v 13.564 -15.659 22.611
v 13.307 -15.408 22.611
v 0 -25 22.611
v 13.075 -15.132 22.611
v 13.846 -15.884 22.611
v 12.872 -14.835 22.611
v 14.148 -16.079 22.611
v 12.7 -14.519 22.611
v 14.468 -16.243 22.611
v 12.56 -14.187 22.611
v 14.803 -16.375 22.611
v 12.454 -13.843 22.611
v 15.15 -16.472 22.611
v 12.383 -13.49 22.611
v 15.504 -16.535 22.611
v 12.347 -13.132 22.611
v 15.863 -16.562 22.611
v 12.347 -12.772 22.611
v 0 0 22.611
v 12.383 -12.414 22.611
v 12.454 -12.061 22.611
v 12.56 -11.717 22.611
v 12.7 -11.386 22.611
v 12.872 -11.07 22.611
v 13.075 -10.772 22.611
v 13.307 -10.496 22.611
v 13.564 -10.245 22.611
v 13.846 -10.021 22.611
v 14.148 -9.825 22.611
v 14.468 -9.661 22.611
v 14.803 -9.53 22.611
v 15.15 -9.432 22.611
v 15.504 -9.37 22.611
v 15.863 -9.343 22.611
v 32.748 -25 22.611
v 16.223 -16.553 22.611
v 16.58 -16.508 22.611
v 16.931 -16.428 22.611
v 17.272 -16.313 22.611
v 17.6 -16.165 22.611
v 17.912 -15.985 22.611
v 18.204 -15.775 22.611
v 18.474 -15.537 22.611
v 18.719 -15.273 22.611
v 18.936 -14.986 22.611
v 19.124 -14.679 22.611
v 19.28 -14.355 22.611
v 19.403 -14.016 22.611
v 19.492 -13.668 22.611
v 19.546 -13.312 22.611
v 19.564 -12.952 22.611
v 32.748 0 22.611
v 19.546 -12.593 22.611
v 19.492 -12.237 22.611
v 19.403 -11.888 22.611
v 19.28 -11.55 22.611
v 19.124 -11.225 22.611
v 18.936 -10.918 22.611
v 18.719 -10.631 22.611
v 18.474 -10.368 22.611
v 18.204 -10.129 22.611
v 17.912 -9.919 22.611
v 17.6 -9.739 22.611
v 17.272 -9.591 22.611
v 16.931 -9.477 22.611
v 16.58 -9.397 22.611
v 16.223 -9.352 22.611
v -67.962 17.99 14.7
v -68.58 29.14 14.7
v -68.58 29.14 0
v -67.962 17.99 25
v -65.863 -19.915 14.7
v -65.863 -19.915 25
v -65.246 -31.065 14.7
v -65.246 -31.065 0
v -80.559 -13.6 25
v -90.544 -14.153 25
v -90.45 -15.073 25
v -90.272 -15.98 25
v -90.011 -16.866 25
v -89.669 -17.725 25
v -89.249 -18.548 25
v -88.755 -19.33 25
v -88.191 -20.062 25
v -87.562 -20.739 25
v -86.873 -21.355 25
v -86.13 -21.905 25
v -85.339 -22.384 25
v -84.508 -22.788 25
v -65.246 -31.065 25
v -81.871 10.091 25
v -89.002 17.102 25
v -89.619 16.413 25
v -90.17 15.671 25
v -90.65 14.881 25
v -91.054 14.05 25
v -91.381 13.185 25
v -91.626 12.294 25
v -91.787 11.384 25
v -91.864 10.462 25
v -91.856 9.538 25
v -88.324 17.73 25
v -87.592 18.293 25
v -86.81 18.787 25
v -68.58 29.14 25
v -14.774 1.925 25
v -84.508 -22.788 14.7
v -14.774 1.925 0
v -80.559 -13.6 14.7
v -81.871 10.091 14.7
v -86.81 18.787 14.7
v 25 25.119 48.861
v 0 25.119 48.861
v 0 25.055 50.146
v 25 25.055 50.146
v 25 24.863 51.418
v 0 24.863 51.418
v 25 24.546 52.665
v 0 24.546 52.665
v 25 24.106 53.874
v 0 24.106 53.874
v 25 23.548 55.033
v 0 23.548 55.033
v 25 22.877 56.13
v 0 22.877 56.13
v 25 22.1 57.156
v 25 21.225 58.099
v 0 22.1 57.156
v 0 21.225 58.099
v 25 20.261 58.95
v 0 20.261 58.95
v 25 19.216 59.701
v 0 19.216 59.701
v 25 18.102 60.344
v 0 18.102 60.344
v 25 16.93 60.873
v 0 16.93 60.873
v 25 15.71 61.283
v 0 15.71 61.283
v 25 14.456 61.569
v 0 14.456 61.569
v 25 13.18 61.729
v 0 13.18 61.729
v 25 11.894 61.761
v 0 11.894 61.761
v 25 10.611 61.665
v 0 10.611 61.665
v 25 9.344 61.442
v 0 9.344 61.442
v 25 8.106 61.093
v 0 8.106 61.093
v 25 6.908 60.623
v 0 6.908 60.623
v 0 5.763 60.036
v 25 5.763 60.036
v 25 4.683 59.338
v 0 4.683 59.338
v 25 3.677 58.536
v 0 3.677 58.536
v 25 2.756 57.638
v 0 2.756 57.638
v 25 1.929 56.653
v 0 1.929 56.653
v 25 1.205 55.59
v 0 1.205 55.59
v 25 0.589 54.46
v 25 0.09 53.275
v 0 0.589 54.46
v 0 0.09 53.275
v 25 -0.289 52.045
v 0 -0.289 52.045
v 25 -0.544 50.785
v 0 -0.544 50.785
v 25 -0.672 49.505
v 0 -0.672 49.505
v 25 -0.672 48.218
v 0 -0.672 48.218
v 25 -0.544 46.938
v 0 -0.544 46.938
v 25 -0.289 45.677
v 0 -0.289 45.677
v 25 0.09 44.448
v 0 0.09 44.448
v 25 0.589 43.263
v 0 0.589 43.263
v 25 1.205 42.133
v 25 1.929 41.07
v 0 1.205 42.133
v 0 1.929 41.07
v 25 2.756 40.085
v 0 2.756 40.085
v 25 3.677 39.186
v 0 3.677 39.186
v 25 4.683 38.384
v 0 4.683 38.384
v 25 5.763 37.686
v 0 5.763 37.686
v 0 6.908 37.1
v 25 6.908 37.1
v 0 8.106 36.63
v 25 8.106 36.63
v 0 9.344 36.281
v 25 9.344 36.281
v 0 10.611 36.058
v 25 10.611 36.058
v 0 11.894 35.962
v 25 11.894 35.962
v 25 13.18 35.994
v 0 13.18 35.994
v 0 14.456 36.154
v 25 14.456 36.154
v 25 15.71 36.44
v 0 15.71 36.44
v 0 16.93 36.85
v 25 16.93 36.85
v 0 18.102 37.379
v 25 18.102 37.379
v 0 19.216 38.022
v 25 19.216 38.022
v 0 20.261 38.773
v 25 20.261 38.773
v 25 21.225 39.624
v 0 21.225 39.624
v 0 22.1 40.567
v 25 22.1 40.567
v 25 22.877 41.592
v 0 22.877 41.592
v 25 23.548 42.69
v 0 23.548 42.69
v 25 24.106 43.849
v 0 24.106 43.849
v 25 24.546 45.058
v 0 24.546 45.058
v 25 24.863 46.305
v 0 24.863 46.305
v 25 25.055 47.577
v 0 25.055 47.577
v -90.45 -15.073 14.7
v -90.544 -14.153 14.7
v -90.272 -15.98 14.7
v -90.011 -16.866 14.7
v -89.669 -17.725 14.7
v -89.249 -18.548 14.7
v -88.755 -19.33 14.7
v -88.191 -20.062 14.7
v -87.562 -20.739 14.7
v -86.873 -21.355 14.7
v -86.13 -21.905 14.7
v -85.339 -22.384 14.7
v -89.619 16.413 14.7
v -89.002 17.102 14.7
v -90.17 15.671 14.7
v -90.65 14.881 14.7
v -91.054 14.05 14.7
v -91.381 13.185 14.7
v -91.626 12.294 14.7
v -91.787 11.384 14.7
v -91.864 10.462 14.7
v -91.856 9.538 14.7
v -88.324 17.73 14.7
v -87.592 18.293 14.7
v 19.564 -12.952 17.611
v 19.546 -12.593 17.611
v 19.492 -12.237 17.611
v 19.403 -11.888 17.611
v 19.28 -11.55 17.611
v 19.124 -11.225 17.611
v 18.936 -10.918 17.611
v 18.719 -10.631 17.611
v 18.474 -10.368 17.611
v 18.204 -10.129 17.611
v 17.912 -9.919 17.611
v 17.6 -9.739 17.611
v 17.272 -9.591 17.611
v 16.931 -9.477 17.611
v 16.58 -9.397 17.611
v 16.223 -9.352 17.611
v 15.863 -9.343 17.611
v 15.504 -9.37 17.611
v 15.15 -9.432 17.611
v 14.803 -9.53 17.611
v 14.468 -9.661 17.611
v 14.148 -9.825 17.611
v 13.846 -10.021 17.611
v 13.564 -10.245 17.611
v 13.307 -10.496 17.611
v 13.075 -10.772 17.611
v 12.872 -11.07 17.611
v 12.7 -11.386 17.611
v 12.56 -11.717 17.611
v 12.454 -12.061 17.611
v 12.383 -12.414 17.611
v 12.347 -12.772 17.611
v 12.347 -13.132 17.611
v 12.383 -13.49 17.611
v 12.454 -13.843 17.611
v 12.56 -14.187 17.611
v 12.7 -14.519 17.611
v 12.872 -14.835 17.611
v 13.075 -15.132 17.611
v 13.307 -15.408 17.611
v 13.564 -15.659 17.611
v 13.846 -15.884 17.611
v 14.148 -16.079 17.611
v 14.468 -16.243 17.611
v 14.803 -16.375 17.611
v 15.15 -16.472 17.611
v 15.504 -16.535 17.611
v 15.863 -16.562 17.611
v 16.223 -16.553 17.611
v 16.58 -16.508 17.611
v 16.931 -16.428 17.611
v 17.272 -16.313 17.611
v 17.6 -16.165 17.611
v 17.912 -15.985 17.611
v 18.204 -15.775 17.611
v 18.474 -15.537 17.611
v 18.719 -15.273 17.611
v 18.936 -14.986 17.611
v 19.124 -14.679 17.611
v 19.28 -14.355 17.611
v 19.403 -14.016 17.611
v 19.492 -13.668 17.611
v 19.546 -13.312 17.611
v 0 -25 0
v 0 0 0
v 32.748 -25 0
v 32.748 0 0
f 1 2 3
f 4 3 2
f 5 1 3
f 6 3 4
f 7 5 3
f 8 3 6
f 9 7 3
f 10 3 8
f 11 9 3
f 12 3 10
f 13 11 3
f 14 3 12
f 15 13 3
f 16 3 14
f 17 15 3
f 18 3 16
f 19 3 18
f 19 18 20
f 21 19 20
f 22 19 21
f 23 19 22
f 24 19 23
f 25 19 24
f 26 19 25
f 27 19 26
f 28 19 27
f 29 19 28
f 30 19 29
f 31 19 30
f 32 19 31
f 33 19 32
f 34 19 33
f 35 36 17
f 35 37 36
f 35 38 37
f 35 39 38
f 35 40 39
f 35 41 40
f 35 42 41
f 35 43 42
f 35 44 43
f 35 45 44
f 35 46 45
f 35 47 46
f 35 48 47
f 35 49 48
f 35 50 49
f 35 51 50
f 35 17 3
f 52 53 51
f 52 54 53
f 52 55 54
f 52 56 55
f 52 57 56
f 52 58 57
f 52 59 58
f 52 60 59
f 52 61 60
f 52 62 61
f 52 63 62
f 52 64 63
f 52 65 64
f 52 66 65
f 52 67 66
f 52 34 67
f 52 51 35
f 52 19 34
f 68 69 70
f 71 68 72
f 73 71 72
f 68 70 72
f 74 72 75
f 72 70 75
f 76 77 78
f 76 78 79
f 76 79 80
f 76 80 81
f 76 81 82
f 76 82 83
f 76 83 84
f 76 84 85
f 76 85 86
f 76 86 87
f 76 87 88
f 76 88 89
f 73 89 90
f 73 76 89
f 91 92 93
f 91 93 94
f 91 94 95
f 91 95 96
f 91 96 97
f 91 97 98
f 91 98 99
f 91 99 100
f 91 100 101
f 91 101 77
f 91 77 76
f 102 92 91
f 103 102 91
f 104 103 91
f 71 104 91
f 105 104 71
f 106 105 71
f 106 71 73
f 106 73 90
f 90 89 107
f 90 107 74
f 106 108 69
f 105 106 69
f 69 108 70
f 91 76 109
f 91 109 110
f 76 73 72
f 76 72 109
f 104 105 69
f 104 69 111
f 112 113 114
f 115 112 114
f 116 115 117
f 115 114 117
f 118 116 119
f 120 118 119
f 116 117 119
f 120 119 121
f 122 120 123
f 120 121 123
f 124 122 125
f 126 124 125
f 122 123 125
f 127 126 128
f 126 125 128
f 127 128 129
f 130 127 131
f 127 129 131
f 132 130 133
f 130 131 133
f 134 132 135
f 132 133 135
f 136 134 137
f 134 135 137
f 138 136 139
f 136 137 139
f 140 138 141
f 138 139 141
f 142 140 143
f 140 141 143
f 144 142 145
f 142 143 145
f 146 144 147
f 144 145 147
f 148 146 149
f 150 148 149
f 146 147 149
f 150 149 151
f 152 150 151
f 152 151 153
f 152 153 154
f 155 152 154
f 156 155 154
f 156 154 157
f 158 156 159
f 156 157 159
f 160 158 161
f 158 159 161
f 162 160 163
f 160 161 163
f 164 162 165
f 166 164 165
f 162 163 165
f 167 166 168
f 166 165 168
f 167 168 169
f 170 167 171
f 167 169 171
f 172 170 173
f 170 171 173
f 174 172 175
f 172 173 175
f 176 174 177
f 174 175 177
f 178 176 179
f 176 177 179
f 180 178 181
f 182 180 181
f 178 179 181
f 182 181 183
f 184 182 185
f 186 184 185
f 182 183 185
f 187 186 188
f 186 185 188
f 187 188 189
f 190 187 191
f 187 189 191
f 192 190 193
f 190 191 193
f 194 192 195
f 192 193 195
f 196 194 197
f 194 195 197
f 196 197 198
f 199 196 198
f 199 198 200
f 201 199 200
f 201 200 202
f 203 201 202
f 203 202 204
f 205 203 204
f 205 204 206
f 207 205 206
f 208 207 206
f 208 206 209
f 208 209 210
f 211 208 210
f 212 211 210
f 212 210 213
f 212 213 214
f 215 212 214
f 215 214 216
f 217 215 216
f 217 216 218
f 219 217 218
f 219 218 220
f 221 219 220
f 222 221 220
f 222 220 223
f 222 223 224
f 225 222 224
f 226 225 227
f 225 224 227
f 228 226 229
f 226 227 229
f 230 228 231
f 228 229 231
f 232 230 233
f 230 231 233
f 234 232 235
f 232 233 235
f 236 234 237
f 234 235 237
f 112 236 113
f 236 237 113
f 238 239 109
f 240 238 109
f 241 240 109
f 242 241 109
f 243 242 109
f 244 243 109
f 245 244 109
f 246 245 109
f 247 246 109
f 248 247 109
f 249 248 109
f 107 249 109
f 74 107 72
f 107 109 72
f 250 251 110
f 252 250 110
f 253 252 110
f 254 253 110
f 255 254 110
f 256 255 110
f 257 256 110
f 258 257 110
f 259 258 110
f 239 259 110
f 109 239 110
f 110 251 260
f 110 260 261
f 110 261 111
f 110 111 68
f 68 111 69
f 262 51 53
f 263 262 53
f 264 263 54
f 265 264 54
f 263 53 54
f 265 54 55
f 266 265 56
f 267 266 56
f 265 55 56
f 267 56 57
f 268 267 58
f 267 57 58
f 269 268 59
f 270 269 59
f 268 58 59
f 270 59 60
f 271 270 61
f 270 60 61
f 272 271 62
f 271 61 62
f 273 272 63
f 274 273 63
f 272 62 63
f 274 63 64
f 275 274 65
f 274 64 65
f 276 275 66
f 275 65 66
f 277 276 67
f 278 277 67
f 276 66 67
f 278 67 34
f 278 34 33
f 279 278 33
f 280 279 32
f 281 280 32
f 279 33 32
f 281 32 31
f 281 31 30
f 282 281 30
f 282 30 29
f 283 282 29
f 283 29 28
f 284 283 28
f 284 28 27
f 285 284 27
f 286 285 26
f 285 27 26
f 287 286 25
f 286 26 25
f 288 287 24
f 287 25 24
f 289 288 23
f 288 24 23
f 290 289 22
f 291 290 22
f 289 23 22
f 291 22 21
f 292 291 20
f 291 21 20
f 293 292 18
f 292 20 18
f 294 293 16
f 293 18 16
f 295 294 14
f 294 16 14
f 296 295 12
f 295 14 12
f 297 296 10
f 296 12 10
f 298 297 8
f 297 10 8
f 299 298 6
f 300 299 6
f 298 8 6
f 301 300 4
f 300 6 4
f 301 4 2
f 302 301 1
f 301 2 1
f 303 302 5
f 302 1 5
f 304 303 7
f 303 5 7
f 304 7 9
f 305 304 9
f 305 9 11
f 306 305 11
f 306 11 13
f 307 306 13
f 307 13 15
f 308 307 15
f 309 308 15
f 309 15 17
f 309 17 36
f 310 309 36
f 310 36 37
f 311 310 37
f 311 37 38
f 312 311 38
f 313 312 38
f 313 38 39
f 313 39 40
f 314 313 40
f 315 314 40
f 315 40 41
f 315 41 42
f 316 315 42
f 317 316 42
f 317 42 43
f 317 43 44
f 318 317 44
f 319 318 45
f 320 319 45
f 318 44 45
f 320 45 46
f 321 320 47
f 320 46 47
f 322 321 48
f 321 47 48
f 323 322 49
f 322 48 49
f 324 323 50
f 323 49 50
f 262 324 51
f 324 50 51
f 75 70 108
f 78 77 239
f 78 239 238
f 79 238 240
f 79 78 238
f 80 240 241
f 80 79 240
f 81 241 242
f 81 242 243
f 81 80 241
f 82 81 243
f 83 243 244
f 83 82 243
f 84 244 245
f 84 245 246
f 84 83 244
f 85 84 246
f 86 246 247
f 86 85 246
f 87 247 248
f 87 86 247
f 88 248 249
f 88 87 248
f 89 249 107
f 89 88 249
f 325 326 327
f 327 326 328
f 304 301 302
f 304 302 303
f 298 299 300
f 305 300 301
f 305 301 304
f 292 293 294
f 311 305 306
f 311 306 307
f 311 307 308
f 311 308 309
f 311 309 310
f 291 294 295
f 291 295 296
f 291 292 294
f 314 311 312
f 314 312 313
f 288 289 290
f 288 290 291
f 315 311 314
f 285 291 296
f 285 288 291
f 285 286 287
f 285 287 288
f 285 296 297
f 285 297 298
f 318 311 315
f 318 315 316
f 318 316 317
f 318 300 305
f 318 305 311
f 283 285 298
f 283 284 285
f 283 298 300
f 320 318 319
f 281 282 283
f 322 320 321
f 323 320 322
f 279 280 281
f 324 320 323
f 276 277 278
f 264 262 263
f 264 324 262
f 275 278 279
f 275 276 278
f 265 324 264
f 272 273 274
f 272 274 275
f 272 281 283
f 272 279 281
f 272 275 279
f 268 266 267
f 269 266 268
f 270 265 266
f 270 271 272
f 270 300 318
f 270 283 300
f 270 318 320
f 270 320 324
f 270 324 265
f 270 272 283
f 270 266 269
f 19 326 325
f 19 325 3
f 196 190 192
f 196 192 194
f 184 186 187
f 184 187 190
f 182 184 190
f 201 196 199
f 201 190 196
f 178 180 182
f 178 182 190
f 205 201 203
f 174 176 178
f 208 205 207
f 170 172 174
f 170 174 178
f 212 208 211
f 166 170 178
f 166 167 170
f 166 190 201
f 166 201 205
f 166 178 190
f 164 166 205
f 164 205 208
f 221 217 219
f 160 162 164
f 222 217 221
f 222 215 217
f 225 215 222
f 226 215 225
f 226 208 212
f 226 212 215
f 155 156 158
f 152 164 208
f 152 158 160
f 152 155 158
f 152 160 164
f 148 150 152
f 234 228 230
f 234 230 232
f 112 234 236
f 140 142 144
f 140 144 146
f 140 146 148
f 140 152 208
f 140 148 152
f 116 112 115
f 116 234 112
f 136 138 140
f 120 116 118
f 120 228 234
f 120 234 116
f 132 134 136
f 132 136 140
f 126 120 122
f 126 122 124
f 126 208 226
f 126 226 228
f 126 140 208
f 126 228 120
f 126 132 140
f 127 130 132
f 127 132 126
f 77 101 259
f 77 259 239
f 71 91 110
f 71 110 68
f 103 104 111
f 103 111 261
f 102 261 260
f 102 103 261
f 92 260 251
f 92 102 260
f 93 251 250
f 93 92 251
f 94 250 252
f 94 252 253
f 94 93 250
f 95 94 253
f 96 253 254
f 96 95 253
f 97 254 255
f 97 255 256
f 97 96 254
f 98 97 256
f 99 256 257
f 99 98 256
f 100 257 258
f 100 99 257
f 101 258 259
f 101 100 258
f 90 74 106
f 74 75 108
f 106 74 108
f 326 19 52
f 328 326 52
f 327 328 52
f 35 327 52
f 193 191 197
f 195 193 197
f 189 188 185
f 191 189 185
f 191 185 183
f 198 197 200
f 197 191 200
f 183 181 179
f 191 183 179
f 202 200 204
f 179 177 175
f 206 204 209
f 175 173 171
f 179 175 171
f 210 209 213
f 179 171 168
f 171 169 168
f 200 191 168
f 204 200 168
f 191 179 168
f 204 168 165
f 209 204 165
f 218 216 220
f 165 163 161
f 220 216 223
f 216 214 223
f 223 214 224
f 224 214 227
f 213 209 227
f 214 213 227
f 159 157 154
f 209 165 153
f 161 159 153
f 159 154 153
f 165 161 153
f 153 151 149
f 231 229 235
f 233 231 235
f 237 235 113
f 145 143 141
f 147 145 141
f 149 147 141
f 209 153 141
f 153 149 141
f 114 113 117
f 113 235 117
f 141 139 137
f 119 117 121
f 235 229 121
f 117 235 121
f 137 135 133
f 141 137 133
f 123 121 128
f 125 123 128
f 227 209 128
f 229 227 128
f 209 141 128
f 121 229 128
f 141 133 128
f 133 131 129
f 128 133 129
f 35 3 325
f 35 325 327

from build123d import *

# Parameters (mm, degrees)
F0_W     = 32.7475219965
F0_H     = 22.611387074
F1_DEPTH = 25
F2_R     = 12.9037605073
F3_DEPTH = 25
F5_DEPTH = 25
F6_R     = 3.610526351
F7_DEPTH = 5
F9_DEPTH = 10.3


with BuildPart() as f1:
    # F0 (on Front) → F1 (new body)
    with BuildSketch(Plane.XZ):
        with Locations((16.3737609982, 11.305693537)):
            Rectangle(F0_W, F0_H)
    extrude(amount=F1_DEPTH)

    # F6 (on face) → F7 (cut)
    with BuildSketch(Plane.XY.offset(22.611387074)):
        with Locations((15.9532800317, -12.9522047937)):
            Circle(F6_R)
    extrude(amount=-F7_DEPTH, mode=Mode.SUBTRACT)


with BuildPart() as f3:
    # F2 (on Right) → F3 (new body)
    with BuildSketch(Plane.YZ):
        with Locations((12.2153488919, 48.8613881171)):
            Circle(F2_R)
    extrude(amount=F3_DEPTH)


with BuildPart() as f5:
    # F4 (on Top) → F5 (new body)
    with BuildSketch(Plane.XY):
        Polygon((-65.2459419214, -31.0648763786), (-14.7739567913, 1.9248621772), (-68.5799010098, 29.1400142014), align=None)
    extrude(amount=F5_DEPTH)

    # F8 (on face) → F9 (join)
    with BuildSketch(Plane.XY.offset(25)):
        with BuildLine():
            Line((-67.962472612, 17.9904445321), (-68.5799010098, 29.1400142014))
            Line((-68.5799010098, 29.1400142014), (-86.8097636916, 18.786591731))
            ThreePointArc((-86.8097636916, 18.786591731), (-90.6495799627, 14.8808293472), (-91.8559779381, 9.5381921034))
            Line((-91.8559779381, 9.5381921034), (-90.5440368998, -14.1529404398))
            ThreePointArc((-90.5440368998, -14.1529404398), (-88.7551072146, -19.3297057789), (-84.5075139047, -22.787612641))
            Line((-84.5075139047, -22.787612641), (-65.2459419214, -31.0648763786))
            Line((-65.2459419214, -31.0648763786), (-65.8633703192, -19.9153067092))
            Line((-65.8633703192, -19.9153067092), (-80.5593347196, -13.6000187709))
            Line((-80.5593347196, -13.6000187709), (-81.8712757579, 10.0911137724))
            Line((-81.8712757579, 10.0911137724), (-67.962472612, 17.9904445321))
        make_face()
    extrude(amount=-F9_DEPTH)


solid = Compound([f1.part, f3.part, f5.part])
